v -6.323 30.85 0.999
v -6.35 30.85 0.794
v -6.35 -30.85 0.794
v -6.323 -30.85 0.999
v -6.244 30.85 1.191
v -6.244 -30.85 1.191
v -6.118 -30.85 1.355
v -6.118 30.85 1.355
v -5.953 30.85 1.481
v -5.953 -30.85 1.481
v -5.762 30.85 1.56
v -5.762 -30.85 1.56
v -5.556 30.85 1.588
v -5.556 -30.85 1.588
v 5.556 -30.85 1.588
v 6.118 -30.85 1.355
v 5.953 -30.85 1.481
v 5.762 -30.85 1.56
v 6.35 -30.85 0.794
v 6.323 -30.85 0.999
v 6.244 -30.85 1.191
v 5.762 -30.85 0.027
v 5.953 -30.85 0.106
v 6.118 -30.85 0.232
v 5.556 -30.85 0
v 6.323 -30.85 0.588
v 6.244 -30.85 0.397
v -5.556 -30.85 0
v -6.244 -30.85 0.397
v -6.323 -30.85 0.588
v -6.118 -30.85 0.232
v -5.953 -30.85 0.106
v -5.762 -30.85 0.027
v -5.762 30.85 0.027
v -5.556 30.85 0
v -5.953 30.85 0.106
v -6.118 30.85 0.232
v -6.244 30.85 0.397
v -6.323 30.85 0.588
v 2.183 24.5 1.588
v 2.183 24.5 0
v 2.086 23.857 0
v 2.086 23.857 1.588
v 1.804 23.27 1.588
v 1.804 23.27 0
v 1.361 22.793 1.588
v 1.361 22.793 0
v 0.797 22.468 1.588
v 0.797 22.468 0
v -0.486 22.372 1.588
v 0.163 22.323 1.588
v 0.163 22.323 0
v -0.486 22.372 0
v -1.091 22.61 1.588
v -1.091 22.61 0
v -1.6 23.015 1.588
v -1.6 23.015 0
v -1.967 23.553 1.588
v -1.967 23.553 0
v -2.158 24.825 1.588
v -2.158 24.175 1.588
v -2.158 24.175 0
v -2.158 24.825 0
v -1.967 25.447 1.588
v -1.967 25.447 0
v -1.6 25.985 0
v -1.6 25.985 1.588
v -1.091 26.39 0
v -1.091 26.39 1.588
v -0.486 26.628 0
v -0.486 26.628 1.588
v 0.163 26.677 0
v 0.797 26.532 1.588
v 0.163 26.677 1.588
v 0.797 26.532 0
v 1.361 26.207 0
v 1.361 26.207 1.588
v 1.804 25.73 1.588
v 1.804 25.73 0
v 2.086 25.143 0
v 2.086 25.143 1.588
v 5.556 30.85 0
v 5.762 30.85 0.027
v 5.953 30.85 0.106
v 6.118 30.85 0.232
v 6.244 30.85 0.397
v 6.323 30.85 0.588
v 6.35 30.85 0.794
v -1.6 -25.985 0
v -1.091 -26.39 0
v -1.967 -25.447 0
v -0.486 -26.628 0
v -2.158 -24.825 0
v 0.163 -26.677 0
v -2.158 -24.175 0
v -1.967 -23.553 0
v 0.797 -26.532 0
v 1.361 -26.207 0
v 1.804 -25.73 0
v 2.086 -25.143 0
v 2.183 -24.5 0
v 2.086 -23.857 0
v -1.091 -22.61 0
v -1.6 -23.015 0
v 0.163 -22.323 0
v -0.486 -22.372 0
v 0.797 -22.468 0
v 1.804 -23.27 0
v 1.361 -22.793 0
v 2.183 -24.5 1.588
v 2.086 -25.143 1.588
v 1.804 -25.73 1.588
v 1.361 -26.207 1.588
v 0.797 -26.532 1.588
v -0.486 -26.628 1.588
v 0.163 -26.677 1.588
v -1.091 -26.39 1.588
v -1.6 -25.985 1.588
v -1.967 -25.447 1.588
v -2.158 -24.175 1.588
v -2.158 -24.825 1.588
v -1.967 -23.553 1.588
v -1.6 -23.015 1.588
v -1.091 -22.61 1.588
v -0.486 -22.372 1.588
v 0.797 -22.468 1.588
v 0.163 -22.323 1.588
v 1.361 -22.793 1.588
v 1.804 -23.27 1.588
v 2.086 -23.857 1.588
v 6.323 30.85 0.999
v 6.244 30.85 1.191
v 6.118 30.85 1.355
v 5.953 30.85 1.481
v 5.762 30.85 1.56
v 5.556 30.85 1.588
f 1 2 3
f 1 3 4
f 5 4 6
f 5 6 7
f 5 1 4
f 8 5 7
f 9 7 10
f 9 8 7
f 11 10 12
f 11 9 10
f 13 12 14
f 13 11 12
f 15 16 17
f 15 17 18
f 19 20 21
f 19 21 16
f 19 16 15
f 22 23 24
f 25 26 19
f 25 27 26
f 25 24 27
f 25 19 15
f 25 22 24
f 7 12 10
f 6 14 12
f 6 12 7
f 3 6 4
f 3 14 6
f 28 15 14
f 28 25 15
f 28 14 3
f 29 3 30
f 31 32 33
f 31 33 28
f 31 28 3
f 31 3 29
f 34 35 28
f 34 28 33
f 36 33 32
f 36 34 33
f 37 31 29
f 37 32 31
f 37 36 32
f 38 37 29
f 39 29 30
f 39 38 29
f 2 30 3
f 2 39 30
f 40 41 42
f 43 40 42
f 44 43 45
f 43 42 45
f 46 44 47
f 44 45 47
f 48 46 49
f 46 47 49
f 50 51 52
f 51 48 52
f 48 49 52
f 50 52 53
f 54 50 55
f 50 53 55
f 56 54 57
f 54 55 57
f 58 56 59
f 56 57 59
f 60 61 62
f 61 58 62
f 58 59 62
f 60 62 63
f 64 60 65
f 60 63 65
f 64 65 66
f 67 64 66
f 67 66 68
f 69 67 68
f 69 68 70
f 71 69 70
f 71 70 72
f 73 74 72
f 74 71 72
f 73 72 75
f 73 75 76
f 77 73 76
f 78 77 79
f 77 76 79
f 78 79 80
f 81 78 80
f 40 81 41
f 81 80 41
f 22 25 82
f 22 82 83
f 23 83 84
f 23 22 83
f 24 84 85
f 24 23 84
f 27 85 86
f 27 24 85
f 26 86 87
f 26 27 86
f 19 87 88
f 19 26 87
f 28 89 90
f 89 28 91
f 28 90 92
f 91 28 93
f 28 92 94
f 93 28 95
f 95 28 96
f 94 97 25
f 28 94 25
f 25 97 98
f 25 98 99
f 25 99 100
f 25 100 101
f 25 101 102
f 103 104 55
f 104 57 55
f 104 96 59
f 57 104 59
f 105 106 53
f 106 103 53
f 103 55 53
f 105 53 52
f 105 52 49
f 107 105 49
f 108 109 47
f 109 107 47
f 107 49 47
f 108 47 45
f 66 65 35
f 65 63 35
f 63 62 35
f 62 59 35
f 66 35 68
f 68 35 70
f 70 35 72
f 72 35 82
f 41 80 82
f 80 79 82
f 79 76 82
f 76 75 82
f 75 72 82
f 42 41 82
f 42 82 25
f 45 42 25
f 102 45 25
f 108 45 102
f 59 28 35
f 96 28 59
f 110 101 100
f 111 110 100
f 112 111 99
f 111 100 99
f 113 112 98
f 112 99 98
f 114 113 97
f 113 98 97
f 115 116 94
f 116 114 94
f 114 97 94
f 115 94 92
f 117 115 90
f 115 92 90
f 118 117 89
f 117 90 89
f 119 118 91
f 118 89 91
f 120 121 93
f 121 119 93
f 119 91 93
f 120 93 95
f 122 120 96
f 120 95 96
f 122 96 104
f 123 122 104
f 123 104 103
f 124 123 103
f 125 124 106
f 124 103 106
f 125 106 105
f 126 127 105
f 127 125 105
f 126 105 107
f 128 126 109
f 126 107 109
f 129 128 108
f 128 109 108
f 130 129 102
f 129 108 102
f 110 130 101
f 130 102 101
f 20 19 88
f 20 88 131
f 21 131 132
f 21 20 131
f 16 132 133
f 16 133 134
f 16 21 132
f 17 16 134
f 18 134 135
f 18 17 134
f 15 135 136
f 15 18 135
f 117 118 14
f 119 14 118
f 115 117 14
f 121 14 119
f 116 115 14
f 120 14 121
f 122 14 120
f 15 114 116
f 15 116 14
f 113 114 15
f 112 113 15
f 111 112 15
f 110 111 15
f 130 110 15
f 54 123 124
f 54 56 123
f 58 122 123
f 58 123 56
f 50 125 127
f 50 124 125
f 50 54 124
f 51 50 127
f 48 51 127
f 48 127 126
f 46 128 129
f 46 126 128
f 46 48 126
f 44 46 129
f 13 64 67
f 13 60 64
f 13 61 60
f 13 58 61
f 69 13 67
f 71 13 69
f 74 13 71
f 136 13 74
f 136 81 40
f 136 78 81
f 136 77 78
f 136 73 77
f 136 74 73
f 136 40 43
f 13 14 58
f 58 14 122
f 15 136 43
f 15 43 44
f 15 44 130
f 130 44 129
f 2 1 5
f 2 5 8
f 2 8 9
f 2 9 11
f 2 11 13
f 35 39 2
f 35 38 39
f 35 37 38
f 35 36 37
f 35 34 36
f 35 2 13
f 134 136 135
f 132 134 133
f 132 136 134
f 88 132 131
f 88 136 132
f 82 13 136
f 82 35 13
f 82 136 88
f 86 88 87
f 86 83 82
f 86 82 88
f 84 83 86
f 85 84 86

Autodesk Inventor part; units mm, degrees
ref_plane "YZ Plane" through (0, 0, 0) normal (1, 0, 0) x (0, 1, 0)
ref_plane "XZ Plane" through (0, 0, 0) normal (0, 1, 0) x (-1, 0, 0)
ref_plane "XY Plane" through (0, 0, 0) normal (0, 0, 1) x (1, 0, 0)
sketch "Sketch1" plane through (0, 0, 0) normal (0, 0, 1) x (1, 0, 0)
  circle A0 centre (0, 24.5) radius 2.1828
  circle A1 centre (0, -24.5) radius 2.1828
  line L0 (6.35, -30.85) -> (-6.35, -30.85)
  line L1 (-6.35, -30.85) -> (-6.35, 30.85)
  line L2 (-6.35, 30.85) -> (6.35, 30.85)
  line L3 (6.35, 30.85) -> (6.35, -30.85)
  line L4 (6.35, -30.85) -> (-6.35, 30.85) construction
  line L5 (-6.35, -30.85) -> (6.35, 30.85) construction
  point P0 (0, 0)
  dimension "d0" = 4.3656
  dimension "d1" = 4.3656
  dimension "d2" = 49
  dimension "d3" = 24.5
  dimension "d4" = 24.5
  dimension "d5" = 12.7
  dimension "d6" = 6.35
  dimension "d7" = 6.35
extrude "Extrusion1" add sketch "Sketch1" along normal blind 1.5875
fillet "Fillet1" radius 0.7937 4 edges at (6.35, 0, 1.5875) (6.35, 0, 0) (-6.35, 0, 0) (-6.35, 0, 1.5875)
properties part number "Part I"
